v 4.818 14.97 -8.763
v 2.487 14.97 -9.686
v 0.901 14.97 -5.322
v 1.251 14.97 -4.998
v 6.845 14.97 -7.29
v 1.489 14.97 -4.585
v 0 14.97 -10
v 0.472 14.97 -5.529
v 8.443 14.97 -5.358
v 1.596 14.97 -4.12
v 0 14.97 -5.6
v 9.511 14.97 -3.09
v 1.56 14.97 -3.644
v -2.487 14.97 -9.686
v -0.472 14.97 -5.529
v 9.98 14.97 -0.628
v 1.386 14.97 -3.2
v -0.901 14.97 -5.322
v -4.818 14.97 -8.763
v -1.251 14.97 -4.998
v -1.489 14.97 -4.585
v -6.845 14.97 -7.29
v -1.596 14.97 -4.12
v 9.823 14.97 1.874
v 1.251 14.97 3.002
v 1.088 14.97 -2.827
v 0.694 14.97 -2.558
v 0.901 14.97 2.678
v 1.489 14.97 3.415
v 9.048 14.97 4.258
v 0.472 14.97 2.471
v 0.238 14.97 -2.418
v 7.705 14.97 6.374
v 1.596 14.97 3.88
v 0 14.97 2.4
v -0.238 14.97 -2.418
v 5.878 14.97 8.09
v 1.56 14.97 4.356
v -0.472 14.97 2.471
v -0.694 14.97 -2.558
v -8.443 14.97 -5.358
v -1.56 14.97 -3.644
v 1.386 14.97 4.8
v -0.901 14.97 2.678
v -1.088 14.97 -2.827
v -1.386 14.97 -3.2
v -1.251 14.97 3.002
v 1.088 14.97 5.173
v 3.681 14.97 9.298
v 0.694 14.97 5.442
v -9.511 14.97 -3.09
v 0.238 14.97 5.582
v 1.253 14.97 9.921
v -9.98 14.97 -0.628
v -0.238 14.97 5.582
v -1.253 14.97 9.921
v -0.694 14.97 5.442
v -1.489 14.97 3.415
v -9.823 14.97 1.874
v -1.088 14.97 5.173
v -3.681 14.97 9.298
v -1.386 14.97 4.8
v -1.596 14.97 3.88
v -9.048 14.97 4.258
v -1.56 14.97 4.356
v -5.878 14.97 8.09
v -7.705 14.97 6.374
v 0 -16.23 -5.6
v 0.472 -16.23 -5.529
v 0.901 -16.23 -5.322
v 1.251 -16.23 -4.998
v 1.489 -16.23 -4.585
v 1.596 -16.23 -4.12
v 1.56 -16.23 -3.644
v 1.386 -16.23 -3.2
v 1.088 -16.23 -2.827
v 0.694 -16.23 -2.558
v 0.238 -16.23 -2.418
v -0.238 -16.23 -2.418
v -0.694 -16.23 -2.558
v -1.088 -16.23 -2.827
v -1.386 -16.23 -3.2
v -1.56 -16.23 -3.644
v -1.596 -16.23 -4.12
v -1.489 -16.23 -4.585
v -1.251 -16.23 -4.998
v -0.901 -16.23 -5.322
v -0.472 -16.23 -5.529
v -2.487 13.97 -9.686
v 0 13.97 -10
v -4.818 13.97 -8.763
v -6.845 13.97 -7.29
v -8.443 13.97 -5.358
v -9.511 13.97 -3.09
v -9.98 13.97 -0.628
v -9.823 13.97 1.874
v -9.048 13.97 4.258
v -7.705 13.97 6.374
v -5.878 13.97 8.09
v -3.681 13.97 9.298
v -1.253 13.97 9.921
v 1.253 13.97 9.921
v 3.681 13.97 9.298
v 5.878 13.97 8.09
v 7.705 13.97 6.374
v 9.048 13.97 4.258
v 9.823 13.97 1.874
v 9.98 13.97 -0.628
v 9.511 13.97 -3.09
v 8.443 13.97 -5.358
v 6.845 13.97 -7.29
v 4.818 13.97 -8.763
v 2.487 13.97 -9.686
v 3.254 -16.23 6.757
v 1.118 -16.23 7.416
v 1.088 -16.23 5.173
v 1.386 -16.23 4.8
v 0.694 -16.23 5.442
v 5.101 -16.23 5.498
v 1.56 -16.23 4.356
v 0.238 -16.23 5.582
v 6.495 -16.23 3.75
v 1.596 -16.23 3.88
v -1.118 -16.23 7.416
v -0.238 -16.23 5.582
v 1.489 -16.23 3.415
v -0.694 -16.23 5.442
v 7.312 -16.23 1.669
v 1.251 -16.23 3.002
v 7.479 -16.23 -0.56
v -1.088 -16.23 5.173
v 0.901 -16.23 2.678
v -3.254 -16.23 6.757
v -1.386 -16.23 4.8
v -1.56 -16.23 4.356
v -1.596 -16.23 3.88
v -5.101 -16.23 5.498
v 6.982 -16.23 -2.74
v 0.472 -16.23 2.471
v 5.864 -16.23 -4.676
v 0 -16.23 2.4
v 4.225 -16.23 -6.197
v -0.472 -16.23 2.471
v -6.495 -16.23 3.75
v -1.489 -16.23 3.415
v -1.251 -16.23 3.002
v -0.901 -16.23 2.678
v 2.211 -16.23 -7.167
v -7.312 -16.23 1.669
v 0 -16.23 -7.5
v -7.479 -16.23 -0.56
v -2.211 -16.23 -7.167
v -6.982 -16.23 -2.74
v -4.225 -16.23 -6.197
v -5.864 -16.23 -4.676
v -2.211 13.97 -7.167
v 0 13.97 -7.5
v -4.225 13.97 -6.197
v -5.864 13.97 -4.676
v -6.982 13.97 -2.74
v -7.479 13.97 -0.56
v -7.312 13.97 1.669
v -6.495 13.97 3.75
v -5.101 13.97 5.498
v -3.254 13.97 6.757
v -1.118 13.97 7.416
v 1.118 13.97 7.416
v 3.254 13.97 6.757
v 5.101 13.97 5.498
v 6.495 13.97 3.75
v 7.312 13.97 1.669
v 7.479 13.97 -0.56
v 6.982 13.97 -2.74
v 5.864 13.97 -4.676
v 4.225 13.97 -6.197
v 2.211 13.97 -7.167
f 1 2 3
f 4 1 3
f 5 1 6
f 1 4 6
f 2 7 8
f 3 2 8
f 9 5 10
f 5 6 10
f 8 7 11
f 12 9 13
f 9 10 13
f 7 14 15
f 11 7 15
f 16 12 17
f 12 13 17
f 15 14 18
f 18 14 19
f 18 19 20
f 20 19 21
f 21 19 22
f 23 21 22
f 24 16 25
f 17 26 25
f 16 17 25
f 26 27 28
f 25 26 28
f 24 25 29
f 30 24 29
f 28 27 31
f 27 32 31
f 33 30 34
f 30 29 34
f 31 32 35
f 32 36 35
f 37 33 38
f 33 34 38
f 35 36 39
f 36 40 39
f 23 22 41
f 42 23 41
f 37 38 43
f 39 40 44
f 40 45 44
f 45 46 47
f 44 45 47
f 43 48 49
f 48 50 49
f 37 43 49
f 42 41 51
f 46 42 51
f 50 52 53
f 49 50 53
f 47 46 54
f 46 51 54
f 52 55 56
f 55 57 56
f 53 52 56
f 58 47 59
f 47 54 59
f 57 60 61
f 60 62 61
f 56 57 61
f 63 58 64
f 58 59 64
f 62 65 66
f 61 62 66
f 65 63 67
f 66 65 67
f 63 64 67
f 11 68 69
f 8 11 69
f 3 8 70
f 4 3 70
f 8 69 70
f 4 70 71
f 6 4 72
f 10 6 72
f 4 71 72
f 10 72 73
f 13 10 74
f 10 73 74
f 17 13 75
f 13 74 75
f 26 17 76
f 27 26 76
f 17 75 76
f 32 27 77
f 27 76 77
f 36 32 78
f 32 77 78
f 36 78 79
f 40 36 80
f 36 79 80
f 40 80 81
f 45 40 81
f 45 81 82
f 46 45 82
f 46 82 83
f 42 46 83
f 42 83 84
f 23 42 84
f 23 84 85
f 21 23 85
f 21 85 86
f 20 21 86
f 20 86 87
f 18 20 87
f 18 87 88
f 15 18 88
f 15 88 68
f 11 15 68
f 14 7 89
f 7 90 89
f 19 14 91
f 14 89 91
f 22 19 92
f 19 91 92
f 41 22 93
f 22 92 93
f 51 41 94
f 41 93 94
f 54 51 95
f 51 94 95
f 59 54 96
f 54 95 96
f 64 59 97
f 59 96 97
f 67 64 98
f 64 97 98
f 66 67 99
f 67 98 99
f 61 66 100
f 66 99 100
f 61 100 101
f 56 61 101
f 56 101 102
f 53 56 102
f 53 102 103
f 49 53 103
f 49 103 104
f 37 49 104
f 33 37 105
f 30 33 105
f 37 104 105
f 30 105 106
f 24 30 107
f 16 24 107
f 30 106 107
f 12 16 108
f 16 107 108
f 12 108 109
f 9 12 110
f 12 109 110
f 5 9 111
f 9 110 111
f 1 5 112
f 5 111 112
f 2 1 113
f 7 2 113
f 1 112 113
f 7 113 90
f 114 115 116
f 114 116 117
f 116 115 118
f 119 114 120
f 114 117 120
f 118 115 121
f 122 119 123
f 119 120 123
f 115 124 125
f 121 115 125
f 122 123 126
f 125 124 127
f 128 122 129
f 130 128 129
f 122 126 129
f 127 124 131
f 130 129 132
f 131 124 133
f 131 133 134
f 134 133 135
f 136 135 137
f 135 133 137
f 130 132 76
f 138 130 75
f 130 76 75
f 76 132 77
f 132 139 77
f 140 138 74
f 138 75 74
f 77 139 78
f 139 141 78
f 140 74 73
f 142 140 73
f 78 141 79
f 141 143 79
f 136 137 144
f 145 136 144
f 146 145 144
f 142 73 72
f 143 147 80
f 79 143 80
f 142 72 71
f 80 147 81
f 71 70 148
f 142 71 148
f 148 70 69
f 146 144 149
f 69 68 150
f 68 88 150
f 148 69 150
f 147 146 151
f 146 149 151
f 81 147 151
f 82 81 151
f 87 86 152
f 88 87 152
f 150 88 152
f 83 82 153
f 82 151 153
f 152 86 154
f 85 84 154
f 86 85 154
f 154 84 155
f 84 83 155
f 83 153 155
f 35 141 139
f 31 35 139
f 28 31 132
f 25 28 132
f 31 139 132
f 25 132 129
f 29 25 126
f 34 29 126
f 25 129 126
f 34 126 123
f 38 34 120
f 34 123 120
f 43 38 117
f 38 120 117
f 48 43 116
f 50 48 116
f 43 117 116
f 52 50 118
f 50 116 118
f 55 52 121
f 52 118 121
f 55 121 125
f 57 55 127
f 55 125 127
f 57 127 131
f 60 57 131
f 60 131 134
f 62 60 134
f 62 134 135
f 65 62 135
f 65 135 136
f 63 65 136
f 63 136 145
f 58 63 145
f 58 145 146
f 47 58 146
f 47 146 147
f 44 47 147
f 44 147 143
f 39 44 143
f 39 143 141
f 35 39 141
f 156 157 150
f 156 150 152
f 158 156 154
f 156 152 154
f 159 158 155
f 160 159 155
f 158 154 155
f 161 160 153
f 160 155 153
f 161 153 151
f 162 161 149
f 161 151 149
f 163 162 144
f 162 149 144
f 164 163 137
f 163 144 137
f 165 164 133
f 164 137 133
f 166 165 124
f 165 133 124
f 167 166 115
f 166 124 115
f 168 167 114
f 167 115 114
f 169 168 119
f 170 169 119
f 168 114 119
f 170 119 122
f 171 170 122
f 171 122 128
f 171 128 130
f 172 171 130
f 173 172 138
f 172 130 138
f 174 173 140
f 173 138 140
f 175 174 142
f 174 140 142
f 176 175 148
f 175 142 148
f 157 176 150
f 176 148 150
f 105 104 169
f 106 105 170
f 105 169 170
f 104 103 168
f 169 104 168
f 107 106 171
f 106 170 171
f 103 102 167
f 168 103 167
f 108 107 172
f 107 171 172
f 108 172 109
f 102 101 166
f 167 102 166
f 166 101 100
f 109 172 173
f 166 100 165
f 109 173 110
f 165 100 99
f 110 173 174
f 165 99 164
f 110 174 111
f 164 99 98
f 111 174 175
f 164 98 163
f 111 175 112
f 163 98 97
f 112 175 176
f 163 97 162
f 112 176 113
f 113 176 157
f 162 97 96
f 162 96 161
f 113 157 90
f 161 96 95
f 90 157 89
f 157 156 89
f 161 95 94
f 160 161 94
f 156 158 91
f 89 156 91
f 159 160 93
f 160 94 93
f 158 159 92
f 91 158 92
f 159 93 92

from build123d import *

# Parameters (mm, degrees)
SKETCH_2_R          = 1.6
CUT_EXTRUDE_1_DEPTH = 42


with BuildPart() as part:
    # 草图1 → 旋转1 (revolve)
    with BuildSketch(Plane.XY, mode=Mode.PRIVATE) as revolve_1_sk:
        Polygon((0, 14.96953125), (10, 14.96953125), (10, 13.96953125), (7.5, 13.96953125), (7.5, -16.23046875), (0, -16.23046875), align=None)
    revolve(revolve_1_sk.sketch.rotate(Axis((0, -16.23046875, 0), (0, 1, 0)), 90), axis=Axis((0, -16.23046875, 0), (0, 1, 0)))

    # 草图2 → 切除-拉伸1 (cut)
    with BuildSketch(Plane.XZ.offset(16.23046875)):
        with Locations(Location((0, 4, 0), (0, 0, 270))):
            Circle(SKETCH_2_R)
        with Locations(Location((0, -4, 0), (0, 0, 270))):
            Circle(SKETCH_2_R)
    extrude(amount=-CUT_EXTRUDE_1_DEPTH, mode=Mode.SUBTRACT)


solid = part.part
